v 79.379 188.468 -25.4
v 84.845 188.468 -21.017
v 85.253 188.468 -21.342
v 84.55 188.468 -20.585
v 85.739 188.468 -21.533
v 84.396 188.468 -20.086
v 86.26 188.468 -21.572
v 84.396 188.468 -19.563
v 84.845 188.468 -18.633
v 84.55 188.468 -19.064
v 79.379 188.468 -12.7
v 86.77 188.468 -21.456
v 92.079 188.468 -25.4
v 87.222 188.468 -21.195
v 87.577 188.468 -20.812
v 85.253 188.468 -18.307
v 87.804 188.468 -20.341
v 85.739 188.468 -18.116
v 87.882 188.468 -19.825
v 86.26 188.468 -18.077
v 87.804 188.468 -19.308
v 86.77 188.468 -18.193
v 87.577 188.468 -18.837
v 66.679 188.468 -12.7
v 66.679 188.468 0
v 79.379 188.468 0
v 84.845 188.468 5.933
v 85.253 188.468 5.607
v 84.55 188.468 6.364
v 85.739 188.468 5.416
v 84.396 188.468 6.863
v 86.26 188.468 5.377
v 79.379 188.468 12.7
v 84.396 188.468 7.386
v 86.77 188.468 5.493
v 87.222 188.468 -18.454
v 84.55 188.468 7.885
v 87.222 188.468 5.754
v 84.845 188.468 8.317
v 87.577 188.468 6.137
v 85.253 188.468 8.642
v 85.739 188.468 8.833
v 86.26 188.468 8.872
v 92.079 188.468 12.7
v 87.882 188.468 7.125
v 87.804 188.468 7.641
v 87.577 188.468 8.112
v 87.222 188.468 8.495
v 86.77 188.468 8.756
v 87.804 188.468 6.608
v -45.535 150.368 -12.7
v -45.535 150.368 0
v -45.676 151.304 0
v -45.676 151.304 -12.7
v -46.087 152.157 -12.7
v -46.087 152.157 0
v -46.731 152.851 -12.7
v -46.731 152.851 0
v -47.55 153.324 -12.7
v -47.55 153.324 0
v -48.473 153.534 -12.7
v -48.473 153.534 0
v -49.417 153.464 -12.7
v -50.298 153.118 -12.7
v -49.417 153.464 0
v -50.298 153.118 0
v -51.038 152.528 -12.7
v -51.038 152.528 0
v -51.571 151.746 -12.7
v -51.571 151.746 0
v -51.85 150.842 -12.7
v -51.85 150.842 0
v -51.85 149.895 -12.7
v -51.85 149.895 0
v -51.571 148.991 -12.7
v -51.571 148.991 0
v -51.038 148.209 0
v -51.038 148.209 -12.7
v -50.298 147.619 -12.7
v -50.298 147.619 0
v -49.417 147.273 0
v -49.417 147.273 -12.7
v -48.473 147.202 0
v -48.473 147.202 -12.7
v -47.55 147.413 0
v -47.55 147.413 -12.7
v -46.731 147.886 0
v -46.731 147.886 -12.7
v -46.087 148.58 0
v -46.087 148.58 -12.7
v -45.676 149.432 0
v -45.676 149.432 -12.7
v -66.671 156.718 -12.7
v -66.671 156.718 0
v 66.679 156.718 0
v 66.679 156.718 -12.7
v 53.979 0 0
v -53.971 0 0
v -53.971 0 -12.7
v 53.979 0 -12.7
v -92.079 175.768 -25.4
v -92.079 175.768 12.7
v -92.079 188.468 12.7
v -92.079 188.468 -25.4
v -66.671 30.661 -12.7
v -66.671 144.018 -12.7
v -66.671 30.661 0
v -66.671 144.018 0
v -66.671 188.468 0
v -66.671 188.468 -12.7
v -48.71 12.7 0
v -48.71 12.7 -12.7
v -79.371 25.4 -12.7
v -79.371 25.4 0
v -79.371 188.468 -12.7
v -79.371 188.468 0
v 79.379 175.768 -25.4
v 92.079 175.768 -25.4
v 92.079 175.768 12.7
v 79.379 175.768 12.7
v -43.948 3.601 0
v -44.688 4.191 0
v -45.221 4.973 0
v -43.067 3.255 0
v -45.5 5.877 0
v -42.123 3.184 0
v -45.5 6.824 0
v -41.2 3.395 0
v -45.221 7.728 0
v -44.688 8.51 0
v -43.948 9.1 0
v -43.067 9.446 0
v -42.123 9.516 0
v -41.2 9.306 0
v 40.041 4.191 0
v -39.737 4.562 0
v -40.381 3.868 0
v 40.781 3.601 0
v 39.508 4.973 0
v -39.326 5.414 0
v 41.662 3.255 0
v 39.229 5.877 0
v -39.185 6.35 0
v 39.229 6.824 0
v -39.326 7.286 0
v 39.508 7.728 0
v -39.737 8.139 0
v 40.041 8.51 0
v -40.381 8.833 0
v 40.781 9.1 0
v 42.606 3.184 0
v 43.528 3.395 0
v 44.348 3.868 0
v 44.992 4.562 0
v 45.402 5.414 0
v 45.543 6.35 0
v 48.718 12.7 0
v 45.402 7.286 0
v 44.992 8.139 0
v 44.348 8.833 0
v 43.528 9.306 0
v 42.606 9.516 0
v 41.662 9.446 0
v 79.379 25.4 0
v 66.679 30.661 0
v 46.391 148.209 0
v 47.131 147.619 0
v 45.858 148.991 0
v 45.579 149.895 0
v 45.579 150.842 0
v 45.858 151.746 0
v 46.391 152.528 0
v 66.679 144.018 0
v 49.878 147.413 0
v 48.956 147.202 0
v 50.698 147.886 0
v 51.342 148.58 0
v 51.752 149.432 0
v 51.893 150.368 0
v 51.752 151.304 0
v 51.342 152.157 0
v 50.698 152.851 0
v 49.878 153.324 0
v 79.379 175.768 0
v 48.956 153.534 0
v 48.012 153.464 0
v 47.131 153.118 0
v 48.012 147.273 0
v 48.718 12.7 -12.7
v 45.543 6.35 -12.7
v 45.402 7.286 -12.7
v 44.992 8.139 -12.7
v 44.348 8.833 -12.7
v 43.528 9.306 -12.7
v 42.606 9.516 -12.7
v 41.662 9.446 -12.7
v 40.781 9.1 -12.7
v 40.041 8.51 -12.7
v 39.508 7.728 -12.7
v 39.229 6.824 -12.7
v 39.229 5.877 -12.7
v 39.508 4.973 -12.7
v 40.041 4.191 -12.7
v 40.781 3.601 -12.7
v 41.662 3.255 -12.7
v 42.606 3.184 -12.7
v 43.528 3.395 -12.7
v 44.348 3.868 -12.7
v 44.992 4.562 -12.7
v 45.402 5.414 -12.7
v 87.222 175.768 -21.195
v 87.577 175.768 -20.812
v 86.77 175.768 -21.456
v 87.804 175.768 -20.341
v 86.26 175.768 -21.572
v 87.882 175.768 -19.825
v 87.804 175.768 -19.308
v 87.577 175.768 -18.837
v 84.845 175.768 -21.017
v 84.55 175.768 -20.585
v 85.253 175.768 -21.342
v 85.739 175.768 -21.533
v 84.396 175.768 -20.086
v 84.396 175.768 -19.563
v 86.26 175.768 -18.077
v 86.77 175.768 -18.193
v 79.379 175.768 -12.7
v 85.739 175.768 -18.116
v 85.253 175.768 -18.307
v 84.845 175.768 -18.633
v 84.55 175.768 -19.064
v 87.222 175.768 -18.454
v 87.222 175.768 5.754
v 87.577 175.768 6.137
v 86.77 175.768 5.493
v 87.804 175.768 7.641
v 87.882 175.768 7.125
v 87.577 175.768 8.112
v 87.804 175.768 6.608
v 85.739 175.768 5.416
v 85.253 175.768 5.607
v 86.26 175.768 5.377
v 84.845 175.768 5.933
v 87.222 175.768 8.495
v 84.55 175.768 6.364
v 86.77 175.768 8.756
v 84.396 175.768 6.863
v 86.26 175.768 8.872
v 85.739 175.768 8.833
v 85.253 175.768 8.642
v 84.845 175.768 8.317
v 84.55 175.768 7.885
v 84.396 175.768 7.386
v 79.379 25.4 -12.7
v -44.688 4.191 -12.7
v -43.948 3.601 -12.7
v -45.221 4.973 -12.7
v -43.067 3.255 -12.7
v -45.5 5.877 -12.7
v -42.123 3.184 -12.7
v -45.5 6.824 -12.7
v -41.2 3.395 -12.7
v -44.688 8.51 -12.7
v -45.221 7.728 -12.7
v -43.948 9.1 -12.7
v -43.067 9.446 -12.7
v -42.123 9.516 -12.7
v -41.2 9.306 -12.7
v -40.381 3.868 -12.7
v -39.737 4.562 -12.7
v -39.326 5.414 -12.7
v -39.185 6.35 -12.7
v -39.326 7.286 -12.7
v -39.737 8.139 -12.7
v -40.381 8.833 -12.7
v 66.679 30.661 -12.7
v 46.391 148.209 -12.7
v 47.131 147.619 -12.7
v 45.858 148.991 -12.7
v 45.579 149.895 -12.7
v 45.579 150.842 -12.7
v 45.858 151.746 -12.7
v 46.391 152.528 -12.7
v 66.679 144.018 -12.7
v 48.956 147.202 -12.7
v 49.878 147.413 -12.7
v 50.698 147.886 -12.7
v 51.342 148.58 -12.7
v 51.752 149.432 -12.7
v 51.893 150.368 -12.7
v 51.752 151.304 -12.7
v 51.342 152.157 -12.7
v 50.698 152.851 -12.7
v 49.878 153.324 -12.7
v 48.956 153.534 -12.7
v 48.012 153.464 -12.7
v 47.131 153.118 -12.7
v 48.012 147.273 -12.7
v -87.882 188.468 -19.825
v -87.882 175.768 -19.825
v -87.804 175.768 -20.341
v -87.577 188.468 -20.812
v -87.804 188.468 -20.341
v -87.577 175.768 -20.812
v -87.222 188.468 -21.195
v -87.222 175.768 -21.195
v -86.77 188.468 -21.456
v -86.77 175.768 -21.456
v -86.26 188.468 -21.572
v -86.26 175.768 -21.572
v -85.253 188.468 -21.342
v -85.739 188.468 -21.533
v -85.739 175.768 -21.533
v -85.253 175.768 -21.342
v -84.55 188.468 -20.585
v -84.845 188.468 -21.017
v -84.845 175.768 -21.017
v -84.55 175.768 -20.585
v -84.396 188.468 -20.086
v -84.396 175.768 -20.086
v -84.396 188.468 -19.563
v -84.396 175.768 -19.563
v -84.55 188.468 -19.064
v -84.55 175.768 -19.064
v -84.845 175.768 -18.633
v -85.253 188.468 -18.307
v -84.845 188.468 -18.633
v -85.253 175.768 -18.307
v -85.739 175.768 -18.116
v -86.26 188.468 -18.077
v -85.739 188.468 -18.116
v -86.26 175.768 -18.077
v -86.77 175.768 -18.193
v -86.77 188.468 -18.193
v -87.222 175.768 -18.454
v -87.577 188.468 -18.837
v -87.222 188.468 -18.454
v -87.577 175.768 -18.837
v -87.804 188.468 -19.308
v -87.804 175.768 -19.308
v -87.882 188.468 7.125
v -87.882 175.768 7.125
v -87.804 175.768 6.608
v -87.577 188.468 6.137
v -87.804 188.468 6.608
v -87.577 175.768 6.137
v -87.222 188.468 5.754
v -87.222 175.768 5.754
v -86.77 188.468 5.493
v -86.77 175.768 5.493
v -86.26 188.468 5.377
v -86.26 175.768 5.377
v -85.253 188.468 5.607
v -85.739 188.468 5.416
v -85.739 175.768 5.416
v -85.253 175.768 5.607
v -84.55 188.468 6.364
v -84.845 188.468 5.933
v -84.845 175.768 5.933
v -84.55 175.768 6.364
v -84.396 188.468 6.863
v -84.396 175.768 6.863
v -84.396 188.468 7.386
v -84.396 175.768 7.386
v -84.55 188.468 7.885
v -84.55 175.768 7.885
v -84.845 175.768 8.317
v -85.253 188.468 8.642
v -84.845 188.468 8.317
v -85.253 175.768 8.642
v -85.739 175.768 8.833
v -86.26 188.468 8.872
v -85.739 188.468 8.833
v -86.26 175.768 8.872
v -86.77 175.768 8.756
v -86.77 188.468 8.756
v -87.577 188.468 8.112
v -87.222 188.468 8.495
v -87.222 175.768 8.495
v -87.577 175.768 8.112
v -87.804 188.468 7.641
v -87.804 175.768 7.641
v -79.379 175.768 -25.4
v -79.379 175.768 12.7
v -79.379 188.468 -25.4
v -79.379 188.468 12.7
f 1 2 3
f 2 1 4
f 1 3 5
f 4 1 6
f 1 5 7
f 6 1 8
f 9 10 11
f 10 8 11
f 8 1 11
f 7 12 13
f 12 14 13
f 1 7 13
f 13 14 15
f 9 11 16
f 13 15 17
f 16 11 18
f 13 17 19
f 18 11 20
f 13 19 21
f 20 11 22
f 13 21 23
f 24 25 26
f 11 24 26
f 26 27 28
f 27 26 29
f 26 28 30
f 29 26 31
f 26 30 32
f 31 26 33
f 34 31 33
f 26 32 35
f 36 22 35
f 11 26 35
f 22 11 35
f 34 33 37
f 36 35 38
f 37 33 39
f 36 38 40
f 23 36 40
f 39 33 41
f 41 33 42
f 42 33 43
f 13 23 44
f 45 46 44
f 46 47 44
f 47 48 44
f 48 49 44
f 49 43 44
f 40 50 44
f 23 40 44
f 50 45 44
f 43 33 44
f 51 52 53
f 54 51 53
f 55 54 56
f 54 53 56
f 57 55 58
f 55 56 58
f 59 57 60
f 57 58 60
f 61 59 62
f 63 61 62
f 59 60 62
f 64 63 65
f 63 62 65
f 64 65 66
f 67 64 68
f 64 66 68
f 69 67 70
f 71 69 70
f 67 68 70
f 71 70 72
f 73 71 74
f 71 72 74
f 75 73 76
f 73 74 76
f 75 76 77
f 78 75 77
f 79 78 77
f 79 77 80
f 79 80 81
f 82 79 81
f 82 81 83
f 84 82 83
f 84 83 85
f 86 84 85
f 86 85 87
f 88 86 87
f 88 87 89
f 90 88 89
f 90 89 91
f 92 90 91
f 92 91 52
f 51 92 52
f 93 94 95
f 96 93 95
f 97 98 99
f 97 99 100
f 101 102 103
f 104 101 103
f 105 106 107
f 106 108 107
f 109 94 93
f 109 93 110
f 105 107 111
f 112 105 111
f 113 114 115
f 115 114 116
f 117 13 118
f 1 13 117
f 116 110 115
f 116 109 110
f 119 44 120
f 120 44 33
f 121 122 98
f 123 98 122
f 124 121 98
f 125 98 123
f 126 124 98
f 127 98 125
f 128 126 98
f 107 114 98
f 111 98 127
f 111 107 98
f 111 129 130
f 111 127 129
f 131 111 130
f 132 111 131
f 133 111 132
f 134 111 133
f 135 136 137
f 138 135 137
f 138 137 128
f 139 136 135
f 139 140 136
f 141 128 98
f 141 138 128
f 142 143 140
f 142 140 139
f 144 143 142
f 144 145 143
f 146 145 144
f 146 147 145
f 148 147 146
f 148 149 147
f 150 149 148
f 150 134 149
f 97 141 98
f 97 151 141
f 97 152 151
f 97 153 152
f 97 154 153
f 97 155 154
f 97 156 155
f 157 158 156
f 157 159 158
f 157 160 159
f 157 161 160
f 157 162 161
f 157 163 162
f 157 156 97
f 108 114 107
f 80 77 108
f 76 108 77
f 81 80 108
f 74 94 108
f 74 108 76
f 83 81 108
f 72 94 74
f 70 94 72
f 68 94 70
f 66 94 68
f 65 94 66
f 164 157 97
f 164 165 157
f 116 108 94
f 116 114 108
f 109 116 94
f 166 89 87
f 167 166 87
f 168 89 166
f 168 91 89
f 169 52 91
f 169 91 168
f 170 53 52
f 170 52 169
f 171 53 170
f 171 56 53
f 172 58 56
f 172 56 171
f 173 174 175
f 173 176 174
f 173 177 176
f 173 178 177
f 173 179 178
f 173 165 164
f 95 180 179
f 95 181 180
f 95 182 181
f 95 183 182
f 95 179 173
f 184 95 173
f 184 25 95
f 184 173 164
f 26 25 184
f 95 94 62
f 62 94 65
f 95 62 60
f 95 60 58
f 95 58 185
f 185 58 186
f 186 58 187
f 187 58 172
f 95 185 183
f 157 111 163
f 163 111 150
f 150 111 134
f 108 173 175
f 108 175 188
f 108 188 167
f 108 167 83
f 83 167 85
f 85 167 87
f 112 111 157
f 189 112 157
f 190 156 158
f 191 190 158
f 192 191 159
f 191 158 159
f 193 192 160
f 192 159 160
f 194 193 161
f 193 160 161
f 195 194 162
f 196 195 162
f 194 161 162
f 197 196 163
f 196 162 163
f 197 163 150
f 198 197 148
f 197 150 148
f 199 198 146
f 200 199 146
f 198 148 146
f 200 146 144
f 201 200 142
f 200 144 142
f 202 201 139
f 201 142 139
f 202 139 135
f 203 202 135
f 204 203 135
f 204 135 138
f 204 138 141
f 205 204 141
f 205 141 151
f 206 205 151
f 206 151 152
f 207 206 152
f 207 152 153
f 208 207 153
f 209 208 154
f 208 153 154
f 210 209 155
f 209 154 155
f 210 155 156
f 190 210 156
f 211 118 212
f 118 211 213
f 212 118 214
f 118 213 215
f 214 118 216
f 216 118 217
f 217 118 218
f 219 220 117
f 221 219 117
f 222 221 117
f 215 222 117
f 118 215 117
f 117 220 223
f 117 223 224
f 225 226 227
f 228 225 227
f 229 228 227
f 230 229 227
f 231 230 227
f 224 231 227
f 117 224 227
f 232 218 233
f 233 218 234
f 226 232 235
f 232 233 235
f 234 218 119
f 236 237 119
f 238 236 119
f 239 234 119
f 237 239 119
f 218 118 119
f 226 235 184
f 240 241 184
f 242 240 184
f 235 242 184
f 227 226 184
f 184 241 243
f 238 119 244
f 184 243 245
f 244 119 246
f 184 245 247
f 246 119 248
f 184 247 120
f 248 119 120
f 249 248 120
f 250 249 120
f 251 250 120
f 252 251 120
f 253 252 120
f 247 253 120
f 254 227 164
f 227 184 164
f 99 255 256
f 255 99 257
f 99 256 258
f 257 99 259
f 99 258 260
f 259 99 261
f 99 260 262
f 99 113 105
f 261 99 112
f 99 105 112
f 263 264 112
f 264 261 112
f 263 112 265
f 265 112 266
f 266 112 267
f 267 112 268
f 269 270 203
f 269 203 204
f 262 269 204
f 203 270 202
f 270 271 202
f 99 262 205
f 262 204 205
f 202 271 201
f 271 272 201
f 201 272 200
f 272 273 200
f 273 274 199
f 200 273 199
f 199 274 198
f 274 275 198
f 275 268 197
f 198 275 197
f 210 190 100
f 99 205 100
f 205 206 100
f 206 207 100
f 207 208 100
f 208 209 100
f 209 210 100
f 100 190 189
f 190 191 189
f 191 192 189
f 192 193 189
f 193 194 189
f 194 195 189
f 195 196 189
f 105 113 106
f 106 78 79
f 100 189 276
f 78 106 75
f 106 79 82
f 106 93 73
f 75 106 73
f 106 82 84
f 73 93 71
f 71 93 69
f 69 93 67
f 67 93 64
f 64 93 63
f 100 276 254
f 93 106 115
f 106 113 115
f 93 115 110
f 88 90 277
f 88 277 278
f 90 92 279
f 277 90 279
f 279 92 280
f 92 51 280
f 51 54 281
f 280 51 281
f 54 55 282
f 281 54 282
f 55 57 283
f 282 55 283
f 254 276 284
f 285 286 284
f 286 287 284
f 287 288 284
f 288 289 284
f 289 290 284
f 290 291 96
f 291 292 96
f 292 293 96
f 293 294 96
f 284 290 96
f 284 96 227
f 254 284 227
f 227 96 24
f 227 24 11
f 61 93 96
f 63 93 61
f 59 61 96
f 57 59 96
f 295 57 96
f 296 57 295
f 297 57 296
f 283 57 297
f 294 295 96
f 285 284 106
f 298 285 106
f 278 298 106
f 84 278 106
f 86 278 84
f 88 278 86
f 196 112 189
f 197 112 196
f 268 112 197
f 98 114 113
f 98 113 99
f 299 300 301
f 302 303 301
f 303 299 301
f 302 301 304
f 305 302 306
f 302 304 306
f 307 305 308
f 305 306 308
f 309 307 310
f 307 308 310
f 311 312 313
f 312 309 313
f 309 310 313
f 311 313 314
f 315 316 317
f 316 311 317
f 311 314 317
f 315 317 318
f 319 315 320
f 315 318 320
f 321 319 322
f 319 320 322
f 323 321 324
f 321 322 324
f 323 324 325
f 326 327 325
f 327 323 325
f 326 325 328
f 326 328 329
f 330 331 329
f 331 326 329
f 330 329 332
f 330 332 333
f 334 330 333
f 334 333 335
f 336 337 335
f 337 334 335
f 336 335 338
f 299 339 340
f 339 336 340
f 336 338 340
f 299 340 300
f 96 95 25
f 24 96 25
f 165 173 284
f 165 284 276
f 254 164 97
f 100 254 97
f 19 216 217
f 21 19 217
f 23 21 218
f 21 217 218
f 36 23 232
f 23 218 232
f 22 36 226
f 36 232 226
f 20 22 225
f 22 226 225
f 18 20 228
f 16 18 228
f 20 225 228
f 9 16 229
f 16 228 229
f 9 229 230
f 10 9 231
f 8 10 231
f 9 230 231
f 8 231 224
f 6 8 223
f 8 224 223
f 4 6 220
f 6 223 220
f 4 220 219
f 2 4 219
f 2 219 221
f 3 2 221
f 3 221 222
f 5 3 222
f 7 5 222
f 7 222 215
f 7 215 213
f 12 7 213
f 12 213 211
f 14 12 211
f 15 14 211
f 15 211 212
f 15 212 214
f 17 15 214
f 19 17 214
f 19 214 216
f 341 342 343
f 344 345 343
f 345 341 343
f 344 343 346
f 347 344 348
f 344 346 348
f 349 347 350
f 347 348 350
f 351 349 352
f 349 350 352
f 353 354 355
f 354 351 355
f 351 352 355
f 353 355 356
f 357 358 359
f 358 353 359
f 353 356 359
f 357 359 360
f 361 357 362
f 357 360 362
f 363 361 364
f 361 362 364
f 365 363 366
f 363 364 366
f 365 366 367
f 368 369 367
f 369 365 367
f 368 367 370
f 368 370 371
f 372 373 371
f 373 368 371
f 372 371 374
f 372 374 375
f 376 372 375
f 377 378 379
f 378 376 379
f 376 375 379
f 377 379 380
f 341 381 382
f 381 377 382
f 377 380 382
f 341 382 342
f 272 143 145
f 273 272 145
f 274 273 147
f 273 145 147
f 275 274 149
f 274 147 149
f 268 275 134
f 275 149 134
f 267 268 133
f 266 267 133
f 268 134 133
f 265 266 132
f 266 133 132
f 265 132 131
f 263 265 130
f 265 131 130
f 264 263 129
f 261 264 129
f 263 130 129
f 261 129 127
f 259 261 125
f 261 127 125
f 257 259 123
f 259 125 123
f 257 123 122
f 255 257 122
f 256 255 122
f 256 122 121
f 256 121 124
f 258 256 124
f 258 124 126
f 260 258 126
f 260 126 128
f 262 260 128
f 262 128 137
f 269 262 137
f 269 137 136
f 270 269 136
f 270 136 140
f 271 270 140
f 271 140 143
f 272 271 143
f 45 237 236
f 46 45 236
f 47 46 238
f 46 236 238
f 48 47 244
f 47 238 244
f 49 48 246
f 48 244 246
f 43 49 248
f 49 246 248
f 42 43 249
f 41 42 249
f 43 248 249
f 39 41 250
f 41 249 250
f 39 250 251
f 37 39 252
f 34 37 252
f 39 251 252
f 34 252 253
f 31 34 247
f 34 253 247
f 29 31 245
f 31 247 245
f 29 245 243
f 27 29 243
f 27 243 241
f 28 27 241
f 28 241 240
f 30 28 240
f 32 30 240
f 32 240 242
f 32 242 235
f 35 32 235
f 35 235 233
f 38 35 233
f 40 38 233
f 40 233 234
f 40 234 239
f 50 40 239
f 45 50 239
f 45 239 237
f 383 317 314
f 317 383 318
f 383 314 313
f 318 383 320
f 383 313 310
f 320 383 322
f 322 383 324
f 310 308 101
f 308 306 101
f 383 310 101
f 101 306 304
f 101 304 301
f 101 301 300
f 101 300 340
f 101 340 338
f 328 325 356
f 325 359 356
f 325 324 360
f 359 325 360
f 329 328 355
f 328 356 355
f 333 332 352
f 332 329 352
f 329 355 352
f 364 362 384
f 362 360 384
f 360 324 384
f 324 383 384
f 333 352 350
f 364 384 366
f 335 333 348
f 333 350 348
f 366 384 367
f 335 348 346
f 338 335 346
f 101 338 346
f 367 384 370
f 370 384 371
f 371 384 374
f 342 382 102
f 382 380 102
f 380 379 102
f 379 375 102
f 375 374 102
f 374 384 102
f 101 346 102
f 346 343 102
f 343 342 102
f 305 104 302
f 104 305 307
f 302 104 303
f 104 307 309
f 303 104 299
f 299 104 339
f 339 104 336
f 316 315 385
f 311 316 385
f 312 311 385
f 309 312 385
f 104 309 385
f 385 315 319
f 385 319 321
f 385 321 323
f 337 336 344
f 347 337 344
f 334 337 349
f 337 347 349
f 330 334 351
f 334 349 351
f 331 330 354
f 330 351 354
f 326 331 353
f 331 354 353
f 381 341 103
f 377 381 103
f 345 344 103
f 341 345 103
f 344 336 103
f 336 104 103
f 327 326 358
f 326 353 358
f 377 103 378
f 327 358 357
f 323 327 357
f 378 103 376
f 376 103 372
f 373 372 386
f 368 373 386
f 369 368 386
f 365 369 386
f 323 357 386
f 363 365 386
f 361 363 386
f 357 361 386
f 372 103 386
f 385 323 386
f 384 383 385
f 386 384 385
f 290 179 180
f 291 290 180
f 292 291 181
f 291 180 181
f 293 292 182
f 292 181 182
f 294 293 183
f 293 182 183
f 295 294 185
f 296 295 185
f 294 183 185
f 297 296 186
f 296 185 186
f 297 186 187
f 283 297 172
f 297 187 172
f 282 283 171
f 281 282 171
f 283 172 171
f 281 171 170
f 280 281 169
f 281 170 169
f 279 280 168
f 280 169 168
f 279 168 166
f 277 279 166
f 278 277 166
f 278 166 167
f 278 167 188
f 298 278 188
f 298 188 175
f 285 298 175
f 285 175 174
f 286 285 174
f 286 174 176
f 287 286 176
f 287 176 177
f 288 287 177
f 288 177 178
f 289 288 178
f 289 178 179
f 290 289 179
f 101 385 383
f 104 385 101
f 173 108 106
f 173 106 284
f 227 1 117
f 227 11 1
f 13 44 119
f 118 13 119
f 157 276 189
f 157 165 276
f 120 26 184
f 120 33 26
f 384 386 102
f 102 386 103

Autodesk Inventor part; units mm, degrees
ref_plane "YZ Plane" through (0, 0, 0) normal (1, 0, 0) x (0, 1, 0)
ref_plane "XZ Plane" through (0, 0, 0) normal (0, 1, 0) x (-1, 0, 0)
ref_plane "XY Plane" through (0, 0, 0) normal (0, 0, 1) x (1, 0, 0)
sketch "Sketch1" plane through (0, 0, 0) normal (0, 0, 1) x (1, 0, 0)
  line L0 (-73.0208, 6.3503) -> (73.0288, 6.3503) construction
  line L1 (73.0288, 6.3503) -> (73.0288, 150.3683) construction
  line L2 (73.0288, 150.3683) -> (-73.0208, 150.3683) construction
  line L3 (-73.0208, 150.3683) -> (-73.0208, 6.3503) construction
  line L4 (-79.3708, 156.7183) -> (79.3788, 156.7183) construction
  line L5 (79.3788, 188.4683) -> (79.3788, 0.0003) construction
  line L6 (79.3788, 0.0003) -> (-79.3708, 0.0003) construction
  line L7 (-79.3708, 0.0003) -> (-79.3708, 156.7183) construction
  line L8 (-66.6708, 144.0183) -> (66.6788, 144.0183) construction
  line L9 (66.6788, 144.0183) -> (66.6788, 12.7003) construction
  line L10 (66.6788, 12.7003) -> (-66.6708, 12.7003) construction
  line L11 (-66.6708, 12.7003) -> (-66.6708, 156.7183) construction
  line L12 (79.3788, 156.7183) -> (66.6788, 144.0183) construction
  line L13 (-79.3708, 156.7183) -> (-66.6708, 144.0183) construction
  line L14 (-53.9708, 131.3183) -> (53.9788, 131.3183) construction
  line L15 (53.9788, 131.3183) -> (53.9788, 25.4003) construction
  line L16 (53.9788, 25.4003) -> (-53.9708, 25.4003) construction
  line L17 (-53.9708, 25.4003) -> (-53.9708, 131.3183) construction
  line L18 (-53.9708, 156.7183) -> (-79.3708, 131.3183) construction
  line L19 (-48.7103, 144.0183) -> (-66.6708, 126.0578) construction
  line L20 (0.004, 131.3183) -> (0.004, 156.7183) construction
  line L21 (-53.9708, 78.3593) -> (-79.3708, 78.3593) construction
  line L22 (-66.6708, 156.7183) -> (66.6788, 156.7183)
  line L23 (-79.3708, 25.4003) -> (-53.9708, 0.0003)
  line L24 (-53.9708, 0.0003) -> (53.9788, 0.0003)
  line L25 (-66.6708, 30.6608) -> (-48.7103, 12.7003)
  line L26 (-48.7103, 12.7003) -> (0.0038, 12.7003)
  line L27 (48.7183, 12.7003) -> (0.0038, 12.7003)
  line L28 (79.3788, 25.4003) -> (53.9788, 0.0003)
  line L29 (66.6788, 144.0183) -> (66.6788, 30.6608)
  line L30 (66.6788, 30.6608) -> (48.7183, 12.7003)
  line L31 (79.3788, 188.4683) -> (79.3788, 25.4003)
  line L32 (-66.6708, 144.0183) -> (66.6788, 144.0183)
  line L33 (-66.6708, 144.0183) -> (-66.6708, 30.6608)
  line L34 (-79.3708, 25.4003) -> (-79.3708, 188.4683)
  line L35 (-66.6708, 156.7183) -> (-66.6708, 188.4683)
  line L36 (-66.6708, 188.4683) -> (-79.3708, 188.4683)
  line L37 (66.6788, 156.7183) -> (66.6788, 188.4683)
  line L38 (66.6788, 188.4683) -> (79.3788, 188.4683)
  line L39 (-48.7103, 156.7183) -> (-48.7103, 0.0003) construction
  line L40 (48.7183, 156.7183) -> (48.7183, 0.0003) construction
  circle A0 centre (-42.3603, 6.3503) radius 3.175
  circle A1 centre (42.3683, 6.3503) radius 3.175
  circle A2 centre (-48.7103, 150.3683) radius 3.175
  circle A3 centre (48.7183, 150.3683) radius 3.175
  point P0 (79.3788, 131.3183)
  dimension "d1" = 144.018
  dimension "d2" = 6.35
  dimension "d3" = 6.35
  dimension "d4" = 12.7
  dimension "d5" = 12.7
  dimension "d22" = 6.35
  dimension "d23" = 6.35
  dimension "d24" = 6.35
  dimension "d25" = 6.35
  dimension "d26" = 6.35
  dimension "d27" = 6.35
extrude "Extrusion1" add sketch "Sketch1" against normal blind 12.7
sketch "Sketch4" plane through (0, 0, -12.7) normal (0, 0, -1) x (-1, 0, 0)
  line L0 (-79.3788, 188.4683) -> (-79.3788, 25.4003) projected
  line L1 (-53.9788, 0.0003) -> (53.9708, 0.0003) projected
  line L2 (-79.3788, 188.4683) -> (-92.0788, 188.4683)
  line L3 (-92.0788, 188.4683) -> (-92.0788, 175.7683)
  line L4 (-92.0788, 175.7683) -> (-79.3788, 175.7683)
  line L5 (-79.3788, 175.7683) -> (-79.3788, 189.4306)
  point P0 (0, 0)
  dimension "d15" = 12.7
  dimension "d16" = 12.7
extrude "Extrusion4" add sketch "Sketch4" along normal blind 12.7 and the other way blind 25.4
mirror "Mirror1" about plane through (0, 0, 0) normal (1, 0, 0) of "Extrusion4"
sketch "Sketch6" plane through (79.3788, 175.7683, -25.4) normal (0, -1, 0) x (1, 0, 0)
  circle A0 centre (6.7505, 32.5247) radius 1.7526
  circle A1 centre (6.7505, 5.5753) radius 1.7526
  line L0 (0, 12.7) -> (0, 25.4) projected
  line L1 (12.7, 38.1) -> (12.7, 0) projected
  line L2 (12.7, 19.05) -> (0, 19.05) construction
  point P0 (-79.3788, 25.4)
  dimension "d30" = 13.4747
  dimension "d31" = 26.9494
extrude "Extrusion5" cut sketch "Sketch6" against normal blind 12.7
mirror "Mirror2" about plane through (0, 0, 0) normal (1, 0, 0) of "Extrusion5"
properties part number "Base"
